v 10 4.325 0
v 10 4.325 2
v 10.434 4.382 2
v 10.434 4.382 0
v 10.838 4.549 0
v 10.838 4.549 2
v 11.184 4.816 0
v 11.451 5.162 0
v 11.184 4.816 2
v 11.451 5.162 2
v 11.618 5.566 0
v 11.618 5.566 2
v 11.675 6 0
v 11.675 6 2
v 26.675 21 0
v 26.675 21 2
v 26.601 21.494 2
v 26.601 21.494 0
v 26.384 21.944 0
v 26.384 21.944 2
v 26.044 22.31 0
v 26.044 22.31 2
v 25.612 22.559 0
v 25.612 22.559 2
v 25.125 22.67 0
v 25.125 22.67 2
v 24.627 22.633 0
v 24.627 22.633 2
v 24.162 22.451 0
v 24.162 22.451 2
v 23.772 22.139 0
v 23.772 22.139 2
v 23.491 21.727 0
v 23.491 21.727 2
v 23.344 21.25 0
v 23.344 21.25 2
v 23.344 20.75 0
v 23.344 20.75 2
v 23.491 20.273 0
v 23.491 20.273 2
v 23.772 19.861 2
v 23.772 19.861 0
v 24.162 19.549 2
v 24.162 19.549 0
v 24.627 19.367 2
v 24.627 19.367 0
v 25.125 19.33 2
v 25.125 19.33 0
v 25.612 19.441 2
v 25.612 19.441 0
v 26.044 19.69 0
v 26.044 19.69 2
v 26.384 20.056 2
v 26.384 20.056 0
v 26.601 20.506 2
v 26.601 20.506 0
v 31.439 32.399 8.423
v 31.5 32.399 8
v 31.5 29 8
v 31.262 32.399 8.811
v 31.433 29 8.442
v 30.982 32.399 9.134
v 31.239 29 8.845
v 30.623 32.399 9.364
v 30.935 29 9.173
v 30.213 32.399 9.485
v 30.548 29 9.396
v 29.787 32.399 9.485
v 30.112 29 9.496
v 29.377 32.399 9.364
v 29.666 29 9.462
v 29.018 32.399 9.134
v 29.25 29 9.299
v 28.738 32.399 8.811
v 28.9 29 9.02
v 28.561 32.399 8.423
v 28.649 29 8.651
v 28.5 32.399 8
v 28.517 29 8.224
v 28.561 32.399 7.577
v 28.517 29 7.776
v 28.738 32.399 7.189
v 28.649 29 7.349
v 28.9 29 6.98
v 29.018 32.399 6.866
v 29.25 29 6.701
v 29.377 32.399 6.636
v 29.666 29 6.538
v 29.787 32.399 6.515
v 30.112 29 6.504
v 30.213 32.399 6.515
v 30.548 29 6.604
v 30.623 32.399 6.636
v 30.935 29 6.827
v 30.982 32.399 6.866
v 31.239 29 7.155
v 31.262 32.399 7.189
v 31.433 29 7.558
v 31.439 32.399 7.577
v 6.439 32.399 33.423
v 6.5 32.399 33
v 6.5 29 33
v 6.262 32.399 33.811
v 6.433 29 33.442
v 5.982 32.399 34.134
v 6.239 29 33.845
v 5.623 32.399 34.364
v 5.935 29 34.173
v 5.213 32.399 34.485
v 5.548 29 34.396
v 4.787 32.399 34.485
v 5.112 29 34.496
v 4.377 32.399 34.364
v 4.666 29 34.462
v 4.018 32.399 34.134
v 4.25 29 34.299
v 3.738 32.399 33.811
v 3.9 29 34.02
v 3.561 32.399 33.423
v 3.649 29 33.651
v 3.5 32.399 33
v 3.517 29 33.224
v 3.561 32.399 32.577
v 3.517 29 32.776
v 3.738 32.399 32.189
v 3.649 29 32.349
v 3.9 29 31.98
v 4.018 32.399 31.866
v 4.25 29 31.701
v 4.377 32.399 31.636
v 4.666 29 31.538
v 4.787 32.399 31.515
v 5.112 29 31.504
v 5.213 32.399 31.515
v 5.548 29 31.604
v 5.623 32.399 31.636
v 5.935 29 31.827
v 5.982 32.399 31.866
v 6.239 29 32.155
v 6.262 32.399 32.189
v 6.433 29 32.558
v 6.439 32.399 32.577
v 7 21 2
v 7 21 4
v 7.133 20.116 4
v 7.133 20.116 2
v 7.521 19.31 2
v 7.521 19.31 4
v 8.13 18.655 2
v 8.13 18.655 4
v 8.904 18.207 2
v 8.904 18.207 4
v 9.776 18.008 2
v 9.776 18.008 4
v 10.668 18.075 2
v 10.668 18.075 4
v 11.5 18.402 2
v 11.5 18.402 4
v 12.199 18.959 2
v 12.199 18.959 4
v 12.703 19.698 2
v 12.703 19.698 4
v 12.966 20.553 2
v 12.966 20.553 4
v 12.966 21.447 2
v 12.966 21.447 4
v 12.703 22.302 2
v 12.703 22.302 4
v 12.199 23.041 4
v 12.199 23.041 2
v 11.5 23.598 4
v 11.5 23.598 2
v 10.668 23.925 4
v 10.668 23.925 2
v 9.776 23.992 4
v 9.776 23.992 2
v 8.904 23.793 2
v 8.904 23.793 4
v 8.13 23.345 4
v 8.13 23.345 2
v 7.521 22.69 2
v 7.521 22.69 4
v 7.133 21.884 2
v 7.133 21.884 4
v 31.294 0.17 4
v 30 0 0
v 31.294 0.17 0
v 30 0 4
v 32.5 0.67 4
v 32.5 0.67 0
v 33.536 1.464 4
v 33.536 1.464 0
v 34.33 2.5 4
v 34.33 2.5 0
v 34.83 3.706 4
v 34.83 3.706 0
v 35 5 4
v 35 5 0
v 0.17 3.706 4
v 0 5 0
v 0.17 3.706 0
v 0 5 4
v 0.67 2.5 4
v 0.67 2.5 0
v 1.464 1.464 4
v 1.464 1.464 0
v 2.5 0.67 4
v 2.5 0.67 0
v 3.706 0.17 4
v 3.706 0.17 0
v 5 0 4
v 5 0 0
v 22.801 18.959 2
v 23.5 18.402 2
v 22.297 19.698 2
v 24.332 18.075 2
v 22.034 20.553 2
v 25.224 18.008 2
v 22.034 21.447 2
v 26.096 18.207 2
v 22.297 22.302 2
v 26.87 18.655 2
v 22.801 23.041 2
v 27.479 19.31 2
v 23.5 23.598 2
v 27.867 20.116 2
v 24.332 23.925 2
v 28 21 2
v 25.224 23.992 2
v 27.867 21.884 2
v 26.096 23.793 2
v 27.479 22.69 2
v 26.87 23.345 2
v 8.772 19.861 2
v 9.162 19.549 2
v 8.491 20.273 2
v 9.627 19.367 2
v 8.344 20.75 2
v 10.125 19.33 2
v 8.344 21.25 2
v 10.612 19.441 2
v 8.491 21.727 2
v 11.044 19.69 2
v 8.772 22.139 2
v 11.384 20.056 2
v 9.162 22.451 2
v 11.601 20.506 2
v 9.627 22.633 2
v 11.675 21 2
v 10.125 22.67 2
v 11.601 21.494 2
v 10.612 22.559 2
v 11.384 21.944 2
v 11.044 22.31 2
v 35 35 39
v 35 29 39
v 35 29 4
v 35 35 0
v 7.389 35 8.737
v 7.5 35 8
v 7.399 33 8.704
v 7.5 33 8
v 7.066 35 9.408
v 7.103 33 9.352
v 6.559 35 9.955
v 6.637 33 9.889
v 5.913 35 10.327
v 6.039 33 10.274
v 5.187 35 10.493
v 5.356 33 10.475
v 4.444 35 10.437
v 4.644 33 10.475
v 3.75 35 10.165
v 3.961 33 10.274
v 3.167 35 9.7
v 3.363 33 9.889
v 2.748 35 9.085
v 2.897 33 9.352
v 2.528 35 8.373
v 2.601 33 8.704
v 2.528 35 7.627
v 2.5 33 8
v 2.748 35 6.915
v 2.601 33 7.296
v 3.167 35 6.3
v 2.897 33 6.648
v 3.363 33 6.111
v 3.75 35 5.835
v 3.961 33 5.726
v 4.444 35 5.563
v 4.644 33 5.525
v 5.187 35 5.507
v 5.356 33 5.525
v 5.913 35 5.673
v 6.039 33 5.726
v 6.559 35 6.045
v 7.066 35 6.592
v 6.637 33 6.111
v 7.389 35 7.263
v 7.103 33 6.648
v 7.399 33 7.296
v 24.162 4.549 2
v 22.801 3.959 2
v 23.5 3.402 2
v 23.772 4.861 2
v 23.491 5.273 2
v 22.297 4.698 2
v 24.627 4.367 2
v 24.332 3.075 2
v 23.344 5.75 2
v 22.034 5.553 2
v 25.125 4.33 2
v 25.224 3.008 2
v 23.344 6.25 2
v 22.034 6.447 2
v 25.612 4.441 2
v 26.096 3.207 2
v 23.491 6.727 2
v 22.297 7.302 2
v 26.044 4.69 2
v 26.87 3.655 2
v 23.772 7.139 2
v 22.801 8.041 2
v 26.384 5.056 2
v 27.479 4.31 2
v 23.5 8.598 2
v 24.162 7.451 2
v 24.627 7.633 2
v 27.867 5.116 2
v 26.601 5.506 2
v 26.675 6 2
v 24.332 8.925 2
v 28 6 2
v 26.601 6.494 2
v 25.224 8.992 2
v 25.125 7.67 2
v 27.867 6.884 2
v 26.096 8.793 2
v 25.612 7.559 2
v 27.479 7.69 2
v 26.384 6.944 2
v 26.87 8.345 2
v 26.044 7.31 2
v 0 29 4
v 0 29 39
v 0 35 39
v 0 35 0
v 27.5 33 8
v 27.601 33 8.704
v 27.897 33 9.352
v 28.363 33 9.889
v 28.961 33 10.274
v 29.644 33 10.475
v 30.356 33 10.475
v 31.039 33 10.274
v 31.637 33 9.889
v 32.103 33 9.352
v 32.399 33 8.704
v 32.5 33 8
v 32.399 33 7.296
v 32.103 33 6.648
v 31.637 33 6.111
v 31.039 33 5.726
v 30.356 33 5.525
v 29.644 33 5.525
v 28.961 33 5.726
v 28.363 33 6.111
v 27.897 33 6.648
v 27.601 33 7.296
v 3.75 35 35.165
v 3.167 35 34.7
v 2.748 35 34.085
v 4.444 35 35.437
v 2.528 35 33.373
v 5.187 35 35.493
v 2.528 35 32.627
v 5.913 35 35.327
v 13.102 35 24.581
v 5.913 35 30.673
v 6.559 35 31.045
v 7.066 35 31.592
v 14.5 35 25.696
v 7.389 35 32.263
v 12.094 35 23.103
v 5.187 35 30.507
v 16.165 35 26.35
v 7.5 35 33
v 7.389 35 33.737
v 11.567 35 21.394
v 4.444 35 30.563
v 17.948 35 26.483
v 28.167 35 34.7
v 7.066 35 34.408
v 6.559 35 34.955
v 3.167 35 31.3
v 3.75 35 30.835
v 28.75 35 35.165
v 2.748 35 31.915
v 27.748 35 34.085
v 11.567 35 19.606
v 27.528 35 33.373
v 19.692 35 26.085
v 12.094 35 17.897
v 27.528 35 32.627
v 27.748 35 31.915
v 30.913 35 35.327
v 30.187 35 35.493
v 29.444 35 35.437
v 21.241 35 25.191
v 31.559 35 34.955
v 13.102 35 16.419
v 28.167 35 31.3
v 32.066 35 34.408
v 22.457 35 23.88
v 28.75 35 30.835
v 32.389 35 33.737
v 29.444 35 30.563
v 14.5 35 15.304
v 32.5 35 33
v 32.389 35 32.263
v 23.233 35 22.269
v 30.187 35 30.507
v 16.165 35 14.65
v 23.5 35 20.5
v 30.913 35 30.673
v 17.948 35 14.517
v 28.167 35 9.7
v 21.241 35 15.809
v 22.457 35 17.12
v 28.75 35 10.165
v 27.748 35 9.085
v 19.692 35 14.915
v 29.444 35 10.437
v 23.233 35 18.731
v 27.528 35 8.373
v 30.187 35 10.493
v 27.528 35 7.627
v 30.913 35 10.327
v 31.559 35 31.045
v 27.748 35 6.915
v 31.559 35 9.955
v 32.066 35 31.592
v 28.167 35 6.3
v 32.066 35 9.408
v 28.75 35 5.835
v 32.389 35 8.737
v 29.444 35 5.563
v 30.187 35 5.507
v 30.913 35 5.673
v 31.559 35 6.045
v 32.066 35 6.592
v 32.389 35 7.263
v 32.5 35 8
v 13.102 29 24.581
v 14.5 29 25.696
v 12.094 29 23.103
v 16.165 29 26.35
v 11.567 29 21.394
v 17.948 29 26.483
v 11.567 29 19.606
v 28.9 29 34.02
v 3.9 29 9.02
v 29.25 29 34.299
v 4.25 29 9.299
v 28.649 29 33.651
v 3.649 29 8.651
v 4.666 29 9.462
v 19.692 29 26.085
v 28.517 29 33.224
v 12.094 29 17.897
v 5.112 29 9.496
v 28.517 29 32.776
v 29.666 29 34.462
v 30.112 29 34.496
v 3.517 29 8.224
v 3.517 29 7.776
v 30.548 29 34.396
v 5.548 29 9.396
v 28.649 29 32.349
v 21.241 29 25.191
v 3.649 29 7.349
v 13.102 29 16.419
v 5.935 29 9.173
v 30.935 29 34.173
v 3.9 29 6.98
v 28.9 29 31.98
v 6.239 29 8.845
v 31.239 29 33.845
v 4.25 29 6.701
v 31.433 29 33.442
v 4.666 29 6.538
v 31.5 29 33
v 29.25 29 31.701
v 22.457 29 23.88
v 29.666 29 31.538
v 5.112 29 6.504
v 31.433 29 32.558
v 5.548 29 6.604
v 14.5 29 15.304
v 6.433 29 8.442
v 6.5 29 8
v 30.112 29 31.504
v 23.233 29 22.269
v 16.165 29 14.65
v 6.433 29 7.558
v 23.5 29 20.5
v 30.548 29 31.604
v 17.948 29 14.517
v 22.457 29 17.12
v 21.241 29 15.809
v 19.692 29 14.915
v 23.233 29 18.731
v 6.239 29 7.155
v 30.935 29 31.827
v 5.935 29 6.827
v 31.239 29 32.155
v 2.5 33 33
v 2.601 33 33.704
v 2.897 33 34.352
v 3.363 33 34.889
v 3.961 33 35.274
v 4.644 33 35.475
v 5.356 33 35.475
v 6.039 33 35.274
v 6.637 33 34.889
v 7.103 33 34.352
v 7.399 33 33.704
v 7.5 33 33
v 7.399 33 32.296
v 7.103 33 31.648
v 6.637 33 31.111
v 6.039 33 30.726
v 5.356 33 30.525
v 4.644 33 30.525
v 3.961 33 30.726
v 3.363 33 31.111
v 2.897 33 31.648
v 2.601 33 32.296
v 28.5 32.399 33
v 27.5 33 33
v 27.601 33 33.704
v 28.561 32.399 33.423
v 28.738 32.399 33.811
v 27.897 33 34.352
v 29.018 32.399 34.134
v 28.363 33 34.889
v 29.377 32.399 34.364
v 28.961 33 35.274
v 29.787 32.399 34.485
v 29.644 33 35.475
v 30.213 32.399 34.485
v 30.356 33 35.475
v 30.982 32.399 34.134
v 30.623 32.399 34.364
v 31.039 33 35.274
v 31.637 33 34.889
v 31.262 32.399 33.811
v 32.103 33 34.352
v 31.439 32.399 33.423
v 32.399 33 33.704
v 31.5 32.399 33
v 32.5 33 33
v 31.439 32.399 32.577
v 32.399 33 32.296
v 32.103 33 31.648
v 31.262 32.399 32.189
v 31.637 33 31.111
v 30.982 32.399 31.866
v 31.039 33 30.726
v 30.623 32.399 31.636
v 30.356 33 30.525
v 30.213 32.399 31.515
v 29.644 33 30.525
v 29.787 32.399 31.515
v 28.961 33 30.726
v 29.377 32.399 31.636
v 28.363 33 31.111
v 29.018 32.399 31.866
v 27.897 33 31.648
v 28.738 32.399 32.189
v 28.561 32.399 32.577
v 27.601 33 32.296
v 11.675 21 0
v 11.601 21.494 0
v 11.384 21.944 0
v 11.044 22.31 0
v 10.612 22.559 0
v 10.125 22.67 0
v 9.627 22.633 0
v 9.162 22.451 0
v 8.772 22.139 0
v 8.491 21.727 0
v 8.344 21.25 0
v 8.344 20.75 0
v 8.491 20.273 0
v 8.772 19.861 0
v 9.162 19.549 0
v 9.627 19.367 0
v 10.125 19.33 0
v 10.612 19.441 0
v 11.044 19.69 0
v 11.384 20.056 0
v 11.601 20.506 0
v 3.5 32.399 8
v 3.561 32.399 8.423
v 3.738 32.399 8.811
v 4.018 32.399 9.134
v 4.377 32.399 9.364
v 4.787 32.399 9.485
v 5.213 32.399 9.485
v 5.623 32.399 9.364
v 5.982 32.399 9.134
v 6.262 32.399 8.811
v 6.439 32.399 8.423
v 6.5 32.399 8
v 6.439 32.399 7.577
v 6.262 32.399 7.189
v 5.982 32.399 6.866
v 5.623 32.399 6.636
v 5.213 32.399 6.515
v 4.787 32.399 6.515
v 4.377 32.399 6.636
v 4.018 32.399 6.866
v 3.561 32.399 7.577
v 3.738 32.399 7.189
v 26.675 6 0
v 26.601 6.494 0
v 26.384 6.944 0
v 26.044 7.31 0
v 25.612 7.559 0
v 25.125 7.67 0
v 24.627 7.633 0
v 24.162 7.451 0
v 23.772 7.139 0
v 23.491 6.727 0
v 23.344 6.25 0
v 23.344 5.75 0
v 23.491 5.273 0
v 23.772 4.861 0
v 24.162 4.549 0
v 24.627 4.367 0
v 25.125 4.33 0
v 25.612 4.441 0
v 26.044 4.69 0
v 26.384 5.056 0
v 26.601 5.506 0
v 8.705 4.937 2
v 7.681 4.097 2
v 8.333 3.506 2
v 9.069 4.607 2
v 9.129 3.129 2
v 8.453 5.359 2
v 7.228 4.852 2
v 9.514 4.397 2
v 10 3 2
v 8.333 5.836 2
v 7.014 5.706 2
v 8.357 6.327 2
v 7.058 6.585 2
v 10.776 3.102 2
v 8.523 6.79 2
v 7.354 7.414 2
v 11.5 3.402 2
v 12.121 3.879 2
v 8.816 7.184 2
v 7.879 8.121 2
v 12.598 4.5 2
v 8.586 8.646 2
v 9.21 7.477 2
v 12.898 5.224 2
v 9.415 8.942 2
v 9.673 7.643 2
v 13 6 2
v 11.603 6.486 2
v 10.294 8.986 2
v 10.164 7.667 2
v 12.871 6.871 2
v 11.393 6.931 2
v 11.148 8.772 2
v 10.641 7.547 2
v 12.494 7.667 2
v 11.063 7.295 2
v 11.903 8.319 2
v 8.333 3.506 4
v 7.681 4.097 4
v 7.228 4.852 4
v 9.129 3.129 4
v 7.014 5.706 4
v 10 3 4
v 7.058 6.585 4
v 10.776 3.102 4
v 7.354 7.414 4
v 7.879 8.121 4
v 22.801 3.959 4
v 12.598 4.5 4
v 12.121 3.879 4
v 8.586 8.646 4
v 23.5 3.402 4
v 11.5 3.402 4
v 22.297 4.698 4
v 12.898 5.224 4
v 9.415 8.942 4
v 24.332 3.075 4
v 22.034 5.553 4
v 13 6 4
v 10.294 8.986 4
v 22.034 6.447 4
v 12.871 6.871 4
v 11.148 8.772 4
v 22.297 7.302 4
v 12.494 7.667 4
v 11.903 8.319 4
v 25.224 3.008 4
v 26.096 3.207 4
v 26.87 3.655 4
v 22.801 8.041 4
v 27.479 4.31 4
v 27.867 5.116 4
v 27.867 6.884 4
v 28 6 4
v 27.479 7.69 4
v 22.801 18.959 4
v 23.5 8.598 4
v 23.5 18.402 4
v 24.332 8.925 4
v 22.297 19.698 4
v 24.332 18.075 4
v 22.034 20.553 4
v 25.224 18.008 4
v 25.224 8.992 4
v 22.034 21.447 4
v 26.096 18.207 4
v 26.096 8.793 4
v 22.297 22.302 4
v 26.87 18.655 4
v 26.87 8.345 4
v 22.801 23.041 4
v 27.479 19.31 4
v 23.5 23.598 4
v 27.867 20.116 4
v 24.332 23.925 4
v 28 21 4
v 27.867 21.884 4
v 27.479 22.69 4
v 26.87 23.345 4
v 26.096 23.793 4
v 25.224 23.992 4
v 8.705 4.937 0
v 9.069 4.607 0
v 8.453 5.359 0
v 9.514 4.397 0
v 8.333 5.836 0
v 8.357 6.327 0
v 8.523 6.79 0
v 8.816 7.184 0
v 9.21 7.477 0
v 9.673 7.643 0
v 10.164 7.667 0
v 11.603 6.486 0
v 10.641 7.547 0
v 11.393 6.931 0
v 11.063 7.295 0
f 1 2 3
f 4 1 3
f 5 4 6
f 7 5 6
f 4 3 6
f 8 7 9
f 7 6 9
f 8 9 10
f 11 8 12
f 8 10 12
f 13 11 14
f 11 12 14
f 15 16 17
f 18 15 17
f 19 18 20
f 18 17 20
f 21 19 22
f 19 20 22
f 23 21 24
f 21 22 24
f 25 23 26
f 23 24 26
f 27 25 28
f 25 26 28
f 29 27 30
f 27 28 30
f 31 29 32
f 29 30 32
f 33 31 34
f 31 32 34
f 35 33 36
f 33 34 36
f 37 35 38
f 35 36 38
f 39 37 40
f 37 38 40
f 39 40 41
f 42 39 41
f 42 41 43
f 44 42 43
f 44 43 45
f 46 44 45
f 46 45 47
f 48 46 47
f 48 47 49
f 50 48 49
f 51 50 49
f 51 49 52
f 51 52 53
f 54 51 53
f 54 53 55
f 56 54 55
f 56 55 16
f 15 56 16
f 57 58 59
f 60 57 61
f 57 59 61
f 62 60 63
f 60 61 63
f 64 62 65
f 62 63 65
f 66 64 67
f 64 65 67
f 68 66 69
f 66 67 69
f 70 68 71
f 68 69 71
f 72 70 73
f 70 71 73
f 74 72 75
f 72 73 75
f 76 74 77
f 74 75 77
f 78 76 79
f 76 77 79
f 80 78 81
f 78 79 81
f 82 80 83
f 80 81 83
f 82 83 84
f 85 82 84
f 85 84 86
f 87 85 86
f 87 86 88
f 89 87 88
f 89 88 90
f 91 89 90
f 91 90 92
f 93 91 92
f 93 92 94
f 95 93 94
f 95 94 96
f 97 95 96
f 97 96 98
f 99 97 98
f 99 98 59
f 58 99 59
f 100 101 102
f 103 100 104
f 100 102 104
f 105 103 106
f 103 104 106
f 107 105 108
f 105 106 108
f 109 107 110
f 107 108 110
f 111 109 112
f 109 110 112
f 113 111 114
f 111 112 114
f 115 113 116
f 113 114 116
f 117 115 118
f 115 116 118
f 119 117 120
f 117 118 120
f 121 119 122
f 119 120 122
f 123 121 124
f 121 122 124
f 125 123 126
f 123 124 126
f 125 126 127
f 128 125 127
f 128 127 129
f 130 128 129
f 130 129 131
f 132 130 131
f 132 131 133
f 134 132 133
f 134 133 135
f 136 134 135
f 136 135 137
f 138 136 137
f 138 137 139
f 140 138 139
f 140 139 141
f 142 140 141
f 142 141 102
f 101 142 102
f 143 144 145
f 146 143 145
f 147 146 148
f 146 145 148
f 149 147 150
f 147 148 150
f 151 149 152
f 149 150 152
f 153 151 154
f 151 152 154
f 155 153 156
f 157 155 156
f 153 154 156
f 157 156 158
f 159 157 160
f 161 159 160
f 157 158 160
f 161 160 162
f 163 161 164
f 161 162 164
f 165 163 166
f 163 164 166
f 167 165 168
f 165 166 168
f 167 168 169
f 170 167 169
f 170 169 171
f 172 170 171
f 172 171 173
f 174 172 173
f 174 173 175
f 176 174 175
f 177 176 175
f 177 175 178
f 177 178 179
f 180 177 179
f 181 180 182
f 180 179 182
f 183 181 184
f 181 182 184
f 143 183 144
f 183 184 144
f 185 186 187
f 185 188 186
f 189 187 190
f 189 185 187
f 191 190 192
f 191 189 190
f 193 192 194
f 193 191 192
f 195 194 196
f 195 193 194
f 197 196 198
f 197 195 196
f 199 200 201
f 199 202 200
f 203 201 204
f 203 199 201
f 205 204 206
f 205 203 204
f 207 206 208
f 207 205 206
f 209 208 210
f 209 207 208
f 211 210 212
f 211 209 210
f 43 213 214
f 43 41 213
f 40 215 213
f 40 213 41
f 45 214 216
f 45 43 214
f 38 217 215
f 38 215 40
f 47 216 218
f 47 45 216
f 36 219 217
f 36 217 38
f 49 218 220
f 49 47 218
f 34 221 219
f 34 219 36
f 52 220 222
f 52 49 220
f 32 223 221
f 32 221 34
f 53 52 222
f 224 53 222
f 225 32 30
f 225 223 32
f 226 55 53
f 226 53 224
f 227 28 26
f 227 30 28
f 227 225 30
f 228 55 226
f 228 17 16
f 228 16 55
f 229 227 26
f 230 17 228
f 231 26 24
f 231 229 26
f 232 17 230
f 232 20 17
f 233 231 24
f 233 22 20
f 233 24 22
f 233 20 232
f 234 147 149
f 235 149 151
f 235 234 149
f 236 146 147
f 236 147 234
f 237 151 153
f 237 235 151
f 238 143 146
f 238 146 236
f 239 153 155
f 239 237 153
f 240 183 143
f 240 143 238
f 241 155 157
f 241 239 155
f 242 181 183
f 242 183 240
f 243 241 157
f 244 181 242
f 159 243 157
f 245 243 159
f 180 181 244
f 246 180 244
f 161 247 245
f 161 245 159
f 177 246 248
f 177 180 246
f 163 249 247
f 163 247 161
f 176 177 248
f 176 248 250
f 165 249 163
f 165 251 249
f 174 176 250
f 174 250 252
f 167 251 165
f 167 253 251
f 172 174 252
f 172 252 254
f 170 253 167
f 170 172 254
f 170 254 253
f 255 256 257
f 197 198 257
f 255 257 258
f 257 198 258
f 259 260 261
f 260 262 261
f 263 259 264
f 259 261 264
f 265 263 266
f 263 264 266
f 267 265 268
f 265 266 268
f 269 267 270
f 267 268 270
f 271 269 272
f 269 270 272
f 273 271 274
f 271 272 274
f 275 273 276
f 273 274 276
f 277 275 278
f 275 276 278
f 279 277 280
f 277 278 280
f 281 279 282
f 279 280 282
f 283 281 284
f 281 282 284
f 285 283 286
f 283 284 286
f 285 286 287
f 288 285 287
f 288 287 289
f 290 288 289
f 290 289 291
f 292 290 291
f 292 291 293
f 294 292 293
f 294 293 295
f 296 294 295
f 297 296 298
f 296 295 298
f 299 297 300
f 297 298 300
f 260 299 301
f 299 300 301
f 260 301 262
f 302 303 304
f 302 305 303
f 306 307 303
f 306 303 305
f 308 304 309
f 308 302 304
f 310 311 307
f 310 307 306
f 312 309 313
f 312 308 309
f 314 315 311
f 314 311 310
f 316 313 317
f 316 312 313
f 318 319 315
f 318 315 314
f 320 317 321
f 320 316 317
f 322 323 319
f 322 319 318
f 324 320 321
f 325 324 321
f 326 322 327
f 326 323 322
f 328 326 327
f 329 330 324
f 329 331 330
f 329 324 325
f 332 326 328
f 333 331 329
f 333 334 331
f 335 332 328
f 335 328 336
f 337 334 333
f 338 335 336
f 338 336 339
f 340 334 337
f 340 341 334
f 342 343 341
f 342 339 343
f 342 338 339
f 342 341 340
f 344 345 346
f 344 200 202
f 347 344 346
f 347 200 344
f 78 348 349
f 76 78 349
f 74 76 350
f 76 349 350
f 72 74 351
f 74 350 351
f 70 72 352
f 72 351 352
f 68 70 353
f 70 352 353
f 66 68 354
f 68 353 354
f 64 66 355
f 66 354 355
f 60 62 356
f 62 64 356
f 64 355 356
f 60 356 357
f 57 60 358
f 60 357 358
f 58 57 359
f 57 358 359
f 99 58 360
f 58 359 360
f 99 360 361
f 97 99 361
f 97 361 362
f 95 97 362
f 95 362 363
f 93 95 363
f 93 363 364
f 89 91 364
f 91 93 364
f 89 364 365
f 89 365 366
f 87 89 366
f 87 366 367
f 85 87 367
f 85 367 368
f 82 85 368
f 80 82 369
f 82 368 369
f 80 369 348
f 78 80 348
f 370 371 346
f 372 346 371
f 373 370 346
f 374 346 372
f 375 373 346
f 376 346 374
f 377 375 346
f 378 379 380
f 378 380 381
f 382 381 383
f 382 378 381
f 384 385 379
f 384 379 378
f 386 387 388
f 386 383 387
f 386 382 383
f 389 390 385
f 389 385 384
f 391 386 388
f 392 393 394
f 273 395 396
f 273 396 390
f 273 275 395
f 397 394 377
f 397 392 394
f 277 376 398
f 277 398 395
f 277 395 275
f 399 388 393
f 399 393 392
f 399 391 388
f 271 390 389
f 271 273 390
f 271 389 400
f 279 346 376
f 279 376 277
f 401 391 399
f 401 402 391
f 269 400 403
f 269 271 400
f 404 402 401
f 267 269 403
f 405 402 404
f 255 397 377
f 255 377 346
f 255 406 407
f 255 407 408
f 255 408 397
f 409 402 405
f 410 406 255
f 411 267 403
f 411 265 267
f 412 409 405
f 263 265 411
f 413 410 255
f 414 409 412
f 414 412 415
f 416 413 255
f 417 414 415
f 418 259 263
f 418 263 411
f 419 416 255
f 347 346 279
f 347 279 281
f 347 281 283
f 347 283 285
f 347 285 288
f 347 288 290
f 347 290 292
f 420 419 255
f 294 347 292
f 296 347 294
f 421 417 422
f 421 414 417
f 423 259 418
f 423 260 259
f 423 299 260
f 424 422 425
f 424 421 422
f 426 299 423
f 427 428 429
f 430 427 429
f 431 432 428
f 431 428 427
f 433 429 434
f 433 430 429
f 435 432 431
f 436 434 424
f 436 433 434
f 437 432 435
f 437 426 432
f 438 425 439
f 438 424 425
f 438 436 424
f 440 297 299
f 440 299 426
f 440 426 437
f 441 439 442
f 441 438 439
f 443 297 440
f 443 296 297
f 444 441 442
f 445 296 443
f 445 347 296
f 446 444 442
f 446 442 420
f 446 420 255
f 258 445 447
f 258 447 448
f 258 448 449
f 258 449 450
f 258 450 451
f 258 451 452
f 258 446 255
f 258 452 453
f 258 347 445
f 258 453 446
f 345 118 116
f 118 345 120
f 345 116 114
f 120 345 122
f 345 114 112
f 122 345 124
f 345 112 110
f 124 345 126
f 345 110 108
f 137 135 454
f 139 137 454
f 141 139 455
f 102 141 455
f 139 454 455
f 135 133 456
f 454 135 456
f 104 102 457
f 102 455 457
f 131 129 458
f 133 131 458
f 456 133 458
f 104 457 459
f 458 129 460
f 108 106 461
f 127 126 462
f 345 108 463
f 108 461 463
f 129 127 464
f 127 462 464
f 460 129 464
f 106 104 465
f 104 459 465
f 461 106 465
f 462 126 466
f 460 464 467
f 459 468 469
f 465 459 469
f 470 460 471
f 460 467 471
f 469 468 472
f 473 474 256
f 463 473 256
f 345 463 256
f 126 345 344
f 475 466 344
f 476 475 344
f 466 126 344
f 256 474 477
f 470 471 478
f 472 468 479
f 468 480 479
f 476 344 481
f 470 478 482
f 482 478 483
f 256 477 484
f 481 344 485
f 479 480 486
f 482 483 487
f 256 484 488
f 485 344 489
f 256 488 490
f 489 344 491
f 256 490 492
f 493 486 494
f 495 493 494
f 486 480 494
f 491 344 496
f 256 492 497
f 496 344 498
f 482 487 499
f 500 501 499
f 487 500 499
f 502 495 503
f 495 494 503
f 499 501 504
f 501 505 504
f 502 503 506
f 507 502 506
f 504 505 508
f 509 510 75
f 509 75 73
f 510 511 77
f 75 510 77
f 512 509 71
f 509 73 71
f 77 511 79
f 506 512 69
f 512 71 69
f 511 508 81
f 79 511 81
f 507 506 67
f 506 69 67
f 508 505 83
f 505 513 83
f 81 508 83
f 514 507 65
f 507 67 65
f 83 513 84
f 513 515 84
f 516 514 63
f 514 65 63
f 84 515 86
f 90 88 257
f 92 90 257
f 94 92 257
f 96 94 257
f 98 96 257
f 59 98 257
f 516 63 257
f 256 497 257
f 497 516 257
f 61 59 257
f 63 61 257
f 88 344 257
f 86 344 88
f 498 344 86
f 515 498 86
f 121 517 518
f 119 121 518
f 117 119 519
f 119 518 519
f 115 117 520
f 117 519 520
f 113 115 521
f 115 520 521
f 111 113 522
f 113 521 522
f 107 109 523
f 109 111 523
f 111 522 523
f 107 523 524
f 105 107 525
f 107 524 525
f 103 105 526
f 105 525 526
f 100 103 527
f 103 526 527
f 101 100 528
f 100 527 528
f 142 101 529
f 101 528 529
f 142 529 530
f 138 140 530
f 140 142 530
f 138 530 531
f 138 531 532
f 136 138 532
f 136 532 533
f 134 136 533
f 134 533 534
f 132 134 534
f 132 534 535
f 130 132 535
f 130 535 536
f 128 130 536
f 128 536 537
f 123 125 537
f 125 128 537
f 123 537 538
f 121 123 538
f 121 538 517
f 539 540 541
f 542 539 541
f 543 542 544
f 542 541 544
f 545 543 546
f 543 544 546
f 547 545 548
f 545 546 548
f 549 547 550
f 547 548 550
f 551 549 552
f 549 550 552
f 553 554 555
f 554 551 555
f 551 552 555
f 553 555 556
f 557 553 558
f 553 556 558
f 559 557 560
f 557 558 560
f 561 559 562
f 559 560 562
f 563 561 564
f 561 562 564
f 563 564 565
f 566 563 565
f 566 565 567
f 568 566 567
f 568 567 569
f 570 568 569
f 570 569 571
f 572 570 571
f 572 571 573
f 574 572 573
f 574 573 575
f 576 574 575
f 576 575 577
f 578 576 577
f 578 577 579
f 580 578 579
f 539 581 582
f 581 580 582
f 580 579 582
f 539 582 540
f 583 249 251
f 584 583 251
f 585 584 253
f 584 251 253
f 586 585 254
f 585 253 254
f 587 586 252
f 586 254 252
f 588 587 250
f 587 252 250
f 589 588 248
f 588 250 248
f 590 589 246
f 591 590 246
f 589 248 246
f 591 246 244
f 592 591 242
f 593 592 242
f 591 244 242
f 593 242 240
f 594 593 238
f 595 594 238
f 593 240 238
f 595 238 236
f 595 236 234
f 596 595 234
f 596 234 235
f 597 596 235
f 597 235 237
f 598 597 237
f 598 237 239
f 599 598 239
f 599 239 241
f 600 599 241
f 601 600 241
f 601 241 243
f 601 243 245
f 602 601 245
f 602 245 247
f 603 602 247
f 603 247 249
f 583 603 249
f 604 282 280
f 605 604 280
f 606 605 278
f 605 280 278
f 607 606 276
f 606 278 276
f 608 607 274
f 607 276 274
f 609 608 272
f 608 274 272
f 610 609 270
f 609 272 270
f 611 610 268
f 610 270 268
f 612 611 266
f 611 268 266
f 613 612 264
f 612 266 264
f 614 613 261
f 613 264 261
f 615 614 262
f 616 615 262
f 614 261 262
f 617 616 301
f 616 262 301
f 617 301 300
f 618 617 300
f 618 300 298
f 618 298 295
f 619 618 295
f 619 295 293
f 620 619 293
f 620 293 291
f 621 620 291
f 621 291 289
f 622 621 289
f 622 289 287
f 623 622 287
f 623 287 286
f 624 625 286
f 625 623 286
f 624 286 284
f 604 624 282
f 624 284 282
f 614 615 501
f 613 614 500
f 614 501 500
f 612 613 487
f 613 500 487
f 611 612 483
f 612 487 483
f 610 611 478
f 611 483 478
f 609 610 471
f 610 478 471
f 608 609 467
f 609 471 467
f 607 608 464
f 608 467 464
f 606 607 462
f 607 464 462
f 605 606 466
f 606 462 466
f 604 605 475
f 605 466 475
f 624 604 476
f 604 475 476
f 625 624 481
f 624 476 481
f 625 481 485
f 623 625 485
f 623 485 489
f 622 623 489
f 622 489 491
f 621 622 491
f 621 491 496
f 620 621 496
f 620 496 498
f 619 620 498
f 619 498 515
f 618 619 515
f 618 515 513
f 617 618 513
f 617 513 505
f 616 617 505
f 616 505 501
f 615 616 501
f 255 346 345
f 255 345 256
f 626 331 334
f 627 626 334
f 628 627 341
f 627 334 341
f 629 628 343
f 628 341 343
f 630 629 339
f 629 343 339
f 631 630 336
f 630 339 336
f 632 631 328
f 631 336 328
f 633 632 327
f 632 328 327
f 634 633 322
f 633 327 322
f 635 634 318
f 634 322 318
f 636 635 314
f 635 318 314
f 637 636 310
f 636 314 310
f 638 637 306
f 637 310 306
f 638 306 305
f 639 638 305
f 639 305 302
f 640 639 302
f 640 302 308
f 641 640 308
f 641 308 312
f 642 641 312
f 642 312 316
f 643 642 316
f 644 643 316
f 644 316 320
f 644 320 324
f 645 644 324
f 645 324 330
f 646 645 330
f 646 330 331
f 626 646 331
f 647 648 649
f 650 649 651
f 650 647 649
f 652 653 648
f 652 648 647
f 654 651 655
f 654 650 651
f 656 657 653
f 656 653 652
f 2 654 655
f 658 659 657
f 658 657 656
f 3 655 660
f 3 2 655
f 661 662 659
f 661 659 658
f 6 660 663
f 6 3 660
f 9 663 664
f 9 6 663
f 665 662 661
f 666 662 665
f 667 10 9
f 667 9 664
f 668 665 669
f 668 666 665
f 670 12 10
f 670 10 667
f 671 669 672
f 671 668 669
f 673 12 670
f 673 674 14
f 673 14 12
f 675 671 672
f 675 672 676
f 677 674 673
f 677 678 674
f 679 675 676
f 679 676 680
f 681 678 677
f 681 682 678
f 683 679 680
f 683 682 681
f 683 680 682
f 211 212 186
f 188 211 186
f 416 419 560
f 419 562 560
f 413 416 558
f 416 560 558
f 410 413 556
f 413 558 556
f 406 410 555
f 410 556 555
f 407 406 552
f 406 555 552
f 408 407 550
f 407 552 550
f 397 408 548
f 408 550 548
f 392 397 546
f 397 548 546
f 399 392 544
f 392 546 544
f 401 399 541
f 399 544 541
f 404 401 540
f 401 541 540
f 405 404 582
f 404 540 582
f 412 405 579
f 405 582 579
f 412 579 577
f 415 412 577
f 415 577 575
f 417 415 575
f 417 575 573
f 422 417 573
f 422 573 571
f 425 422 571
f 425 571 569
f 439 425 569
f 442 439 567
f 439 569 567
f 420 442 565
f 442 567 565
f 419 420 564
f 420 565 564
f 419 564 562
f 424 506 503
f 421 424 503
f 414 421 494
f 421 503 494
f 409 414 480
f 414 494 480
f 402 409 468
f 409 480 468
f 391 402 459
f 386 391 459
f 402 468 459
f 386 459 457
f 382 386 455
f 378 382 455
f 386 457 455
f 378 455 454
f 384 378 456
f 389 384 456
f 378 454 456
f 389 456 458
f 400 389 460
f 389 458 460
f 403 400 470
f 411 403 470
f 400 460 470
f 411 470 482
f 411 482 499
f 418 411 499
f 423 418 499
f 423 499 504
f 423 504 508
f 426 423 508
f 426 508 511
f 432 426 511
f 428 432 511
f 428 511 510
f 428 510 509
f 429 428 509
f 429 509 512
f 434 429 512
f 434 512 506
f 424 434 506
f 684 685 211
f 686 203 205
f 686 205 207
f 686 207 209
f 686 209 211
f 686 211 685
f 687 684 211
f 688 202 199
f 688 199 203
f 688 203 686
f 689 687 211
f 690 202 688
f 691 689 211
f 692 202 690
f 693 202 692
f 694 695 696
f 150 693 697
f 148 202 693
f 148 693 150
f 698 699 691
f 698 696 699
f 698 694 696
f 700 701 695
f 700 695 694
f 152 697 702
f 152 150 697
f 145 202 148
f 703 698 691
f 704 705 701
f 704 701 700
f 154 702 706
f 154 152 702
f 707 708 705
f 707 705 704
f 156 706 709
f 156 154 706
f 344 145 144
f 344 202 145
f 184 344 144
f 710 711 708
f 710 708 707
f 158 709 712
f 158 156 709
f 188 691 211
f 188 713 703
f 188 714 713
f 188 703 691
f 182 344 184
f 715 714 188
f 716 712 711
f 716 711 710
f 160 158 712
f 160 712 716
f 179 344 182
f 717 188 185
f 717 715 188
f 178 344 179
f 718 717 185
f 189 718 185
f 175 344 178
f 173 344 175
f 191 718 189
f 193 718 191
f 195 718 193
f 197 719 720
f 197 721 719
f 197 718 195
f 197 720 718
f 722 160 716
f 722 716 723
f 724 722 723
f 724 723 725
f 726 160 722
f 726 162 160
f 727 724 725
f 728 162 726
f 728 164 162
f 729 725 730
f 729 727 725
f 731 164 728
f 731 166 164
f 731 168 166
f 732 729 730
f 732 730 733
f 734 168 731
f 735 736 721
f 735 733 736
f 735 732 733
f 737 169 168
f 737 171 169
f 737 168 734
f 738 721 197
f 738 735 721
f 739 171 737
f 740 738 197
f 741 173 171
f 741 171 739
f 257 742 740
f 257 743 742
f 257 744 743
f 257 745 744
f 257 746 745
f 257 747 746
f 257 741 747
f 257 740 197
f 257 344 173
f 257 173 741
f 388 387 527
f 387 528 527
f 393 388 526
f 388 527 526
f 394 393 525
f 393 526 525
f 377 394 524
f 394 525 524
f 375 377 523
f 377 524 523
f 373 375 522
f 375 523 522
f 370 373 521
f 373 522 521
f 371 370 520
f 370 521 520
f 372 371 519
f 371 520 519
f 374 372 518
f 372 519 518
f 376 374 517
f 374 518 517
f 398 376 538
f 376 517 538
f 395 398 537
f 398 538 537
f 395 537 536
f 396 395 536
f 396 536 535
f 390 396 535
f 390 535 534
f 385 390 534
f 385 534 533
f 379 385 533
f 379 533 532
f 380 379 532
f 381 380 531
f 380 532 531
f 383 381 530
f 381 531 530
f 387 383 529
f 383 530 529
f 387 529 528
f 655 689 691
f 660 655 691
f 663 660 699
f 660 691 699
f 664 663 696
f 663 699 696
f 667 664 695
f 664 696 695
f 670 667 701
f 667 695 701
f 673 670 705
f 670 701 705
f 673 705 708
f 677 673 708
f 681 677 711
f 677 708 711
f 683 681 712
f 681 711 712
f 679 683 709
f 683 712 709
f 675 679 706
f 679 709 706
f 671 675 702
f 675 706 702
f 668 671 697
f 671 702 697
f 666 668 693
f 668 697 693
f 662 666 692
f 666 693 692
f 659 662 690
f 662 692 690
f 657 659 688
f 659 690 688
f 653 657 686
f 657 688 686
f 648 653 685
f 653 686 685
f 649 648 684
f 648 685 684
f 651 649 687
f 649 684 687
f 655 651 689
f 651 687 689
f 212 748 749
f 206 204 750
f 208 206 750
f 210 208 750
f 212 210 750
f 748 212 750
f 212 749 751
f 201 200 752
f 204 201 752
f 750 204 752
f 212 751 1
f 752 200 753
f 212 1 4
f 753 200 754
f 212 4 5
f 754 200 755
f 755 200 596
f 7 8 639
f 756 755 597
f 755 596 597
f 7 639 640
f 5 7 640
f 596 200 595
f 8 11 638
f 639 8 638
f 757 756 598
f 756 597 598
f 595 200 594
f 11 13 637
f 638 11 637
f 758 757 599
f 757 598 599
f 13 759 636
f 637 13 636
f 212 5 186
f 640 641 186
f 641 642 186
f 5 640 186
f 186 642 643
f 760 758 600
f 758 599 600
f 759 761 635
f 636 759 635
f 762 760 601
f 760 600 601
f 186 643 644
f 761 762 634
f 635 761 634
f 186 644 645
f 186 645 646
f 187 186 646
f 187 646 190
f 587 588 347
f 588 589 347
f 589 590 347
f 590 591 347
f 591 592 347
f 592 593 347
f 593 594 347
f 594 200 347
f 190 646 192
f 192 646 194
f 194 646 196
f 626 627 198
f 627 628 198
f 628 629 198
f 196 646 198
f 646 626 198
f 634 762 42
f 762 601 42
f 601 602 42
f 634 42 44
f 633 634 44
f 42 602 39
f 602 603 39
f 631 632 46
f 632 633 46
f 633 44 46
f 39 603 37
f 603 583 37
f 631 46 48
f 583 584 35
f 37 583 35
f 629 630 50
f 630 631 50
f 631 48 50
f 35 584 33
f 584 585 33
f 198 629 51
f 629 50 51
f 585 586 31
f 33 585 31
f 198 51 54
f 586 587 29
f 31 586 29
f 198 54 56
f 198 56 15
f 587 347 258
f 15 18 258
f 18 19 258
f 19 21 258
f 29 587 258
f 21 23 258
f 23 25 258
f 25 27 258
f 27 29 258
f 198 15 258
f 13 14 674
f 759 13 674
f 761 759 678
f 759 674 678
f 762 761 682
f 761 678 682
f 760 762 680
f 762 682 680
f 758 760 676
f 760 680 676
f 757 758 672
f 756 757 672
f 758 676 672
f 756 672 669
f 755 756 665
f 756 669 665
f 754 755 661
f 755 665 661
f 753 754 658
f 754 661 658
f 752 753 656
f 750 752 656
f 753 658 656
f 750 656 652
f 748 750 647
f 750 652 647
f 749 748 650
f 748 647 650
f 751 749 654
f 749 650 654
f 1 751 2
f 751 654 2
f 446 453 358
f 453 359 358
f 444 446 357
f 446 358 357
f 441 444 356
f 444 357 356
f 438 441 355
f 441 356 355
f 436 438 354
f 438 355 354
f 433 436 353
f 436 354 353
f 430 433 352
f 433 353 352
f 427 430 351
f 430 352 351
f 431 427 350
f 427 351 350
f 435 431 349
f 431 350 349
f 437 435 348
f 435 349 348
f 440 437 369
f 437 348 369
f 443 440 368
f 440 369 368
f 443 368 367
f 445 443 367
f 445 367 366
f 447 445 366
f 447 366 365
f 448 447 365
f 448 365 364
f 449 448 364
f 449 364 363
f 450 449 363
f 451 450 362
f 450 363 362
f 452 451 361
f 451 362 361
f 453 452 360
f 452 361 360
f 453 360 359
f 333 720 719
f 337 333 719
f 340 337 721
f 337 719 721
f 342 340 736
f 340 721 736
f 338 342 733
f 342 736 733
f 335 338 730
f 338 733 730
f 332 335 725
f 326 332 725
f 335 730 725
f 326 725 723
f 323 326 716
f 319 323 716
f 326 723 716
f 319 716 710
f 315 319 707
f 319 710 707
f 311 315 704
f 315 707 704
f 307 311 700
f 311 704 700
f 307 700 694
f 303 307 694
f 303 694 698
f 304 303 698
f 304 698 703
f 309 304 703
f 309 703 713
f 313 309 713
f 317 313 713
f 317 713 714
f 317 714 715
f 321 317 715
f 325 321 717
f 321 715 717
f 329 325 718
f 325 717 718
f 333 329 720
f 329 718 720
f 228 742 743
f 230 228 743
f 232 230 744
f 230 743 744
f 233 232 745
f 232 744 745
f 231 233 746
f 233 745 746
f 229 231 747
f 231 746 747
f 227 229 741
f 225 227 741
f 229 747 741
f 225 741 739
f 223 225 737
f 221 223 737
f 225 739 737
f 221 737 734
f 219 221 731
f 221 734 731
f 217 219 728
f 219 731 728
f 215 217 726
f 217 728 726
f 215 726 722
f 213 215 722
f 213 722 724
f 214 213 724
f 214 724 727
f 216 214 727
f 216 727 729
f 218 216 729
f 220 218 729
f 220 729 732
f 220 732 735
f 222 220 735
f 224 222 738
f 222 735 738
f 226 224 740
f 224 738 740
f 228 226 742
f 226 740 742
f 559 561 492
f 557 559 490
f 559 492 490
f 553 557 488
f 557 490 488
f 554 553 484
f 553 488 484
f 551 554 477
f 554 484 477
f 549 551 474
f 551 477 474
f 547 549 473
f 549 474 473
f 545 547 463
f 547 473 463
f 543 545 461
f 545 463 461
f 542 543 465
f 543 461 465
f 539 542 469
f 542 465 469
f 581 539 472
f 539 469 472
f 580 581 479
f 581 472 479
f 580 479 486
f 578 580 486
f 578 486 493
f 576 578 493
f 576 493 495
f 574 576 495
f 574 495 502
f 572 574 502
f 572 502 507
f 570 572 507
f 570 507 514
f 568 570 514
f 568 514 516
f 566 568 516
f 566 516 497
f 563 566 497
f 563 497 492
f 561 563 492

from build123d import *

# Parameters (mm, degrees)
F0_W      = 35
F0_H      = 35
F1_DEPTH  = 4
F2_R      = 3
F2_R_2    = 1.675
F4_DEPTH  = 2
F5_R      = 5
F6_DEPTH  = 12.5
F3_W      = 35
F3_H      = 6
F7_DEPTH  = 35
F8_R      = 6
F8_R_2    = 1.5
F9_DEPTH  = 6.001
F11_D     = 5
F11_DEPTH = 2
F11_TIP   = 1.5021515476


with BuildPart() as f1:
    # F0 (on Top) → F1 (new body)
    with BuildSketch(Plane.XY):
        with Locations((17.5, 17.5)):
            Rectangle(F0_W, F0_H)
    extrude(amount=F1_DEPTH)

    # F2 (on face) → F4 (cut)
    with BuildSketch(Plane.XY.offset(4)):
        with BuildLine():
            ThreePointArc((13, 21), (10, 24), (7, 21))
            ThreePointArc((7, 21), (10, 18), (13, 21))
        make_face()
        with BuildLine():
            ThreePointArc((8.325, 21), (10, 22.675), (11.675, 21))
            ThreePointArc((11.675, 21), (10, 19.325), (8.325, 21))
        make_face(mode=Mode.SUBTRACT)
        with Locations((25, 21)):
            Circle(F2_R)
        with Locations((25, 21)):
            Circle(F2_R_2, mode=Mode.SUBTRACT)
        with Locations((25, 6)):
            Circle(F2_R)
        with Locations((25, 6)):
            Circle(F2_R_2, mode=Mode.SUBTRACT)
        with BuildLine():
            ThreePointArc((13, 6), (7.8786796564, 8.1213203436), (10, 3))
            ThreePointArc((10, 3), (12.1213203436, 3.8786796564), (13, 6))
        make_face()
        with BuildLine():
            ThreePointArc((11.675, 6), (11.1844038585, 4.8155961415), (10, 4.325))
            ThreePointArc((10, 4.325), (8.8155961415, 7.1844038585), (11.675, 6))
        make_face(mode=Mode.SUBTRACT)
    extrude(amount=-F4_DEPTH, mode=Mode.SUBTRACT)

    # F5
    f5_edges = [f1.edges().sort_by_distance(p)[0] for p in [
        (0, 0, 2),
        (35, 0, 2),
    ]]
    fillet(f5_edges, radius=F5_R)

    # F2 (on face) → F6 (cut, symmetric)
    with BuildSketch(Plane.XY.offset(4)):
        with BuildLine():
            ThreePointArc((8.325, 21), (10, 19.325), (11.675, 21))
            ThreePointArc((11.675, 21), (10, 22.675), (8.325, 21))
        make_face()
        with Locations((25, 21)):
            Circle(F2_R_2)
        with Locations((25, 6)):
            Circle(F2_R_2)
        with BuildLine():
            ThreePointArc((11.675, 6), (8.8155961415, 7.1844038585), (10, 4.325))
            ThreePointArc((10, 4.325), (11.1844038585, 4.8155961415), (11.675, 6))
        make_face()
    extrude(amount=F6_DEPTH, both=True, mode=Mode.SUBTRACT)

    # F3 (on face) → F7 (join)
    with BuildSketch(Plane.XY.offset(4)):
        with Locations((17.5, 32)):
            Rectangle(F3_W, F3_H)
    extrude(amount=F7_DEPTH)

    # F8 (on face) → F9 (cut, through all)
    with BuildSketch(Plane.XZ.offset(-29)):
        with Locations((17.5, 20.5)):
            Circle(F8_R)
        with Locations((30, 33)):
            Circle(F8_R_2)
        with Locations((5, 33)):
            Circle(F8_R_2)
        with Locations((5, 8)):
            Circle(F8_R_2)
        with Locations((30, 8)):
            Circle(F8_R_2)
    extrude(amount=-F9_DEPTH, mode=Mode.SUBTRACT)

    # F11
    with Locations(Plane(origin=(0, 35, 0), x_dir=(-1, 0, 0), z_dir=(0, 1, 0))):
        with Locations((-30, 33), (-30, 8), (-5, 8), (-5, 33)):
            Hole(F11_D / 2, depth=F11_DEPTH)
            with Locations((0, 0, -(F11_DEPTH + F11_TIP / 2))):  # 118° drill point
                Cone(0, F11_D / 2, F11_TIP, mode=Mode.SUBTRACT)


solid = f1.part
